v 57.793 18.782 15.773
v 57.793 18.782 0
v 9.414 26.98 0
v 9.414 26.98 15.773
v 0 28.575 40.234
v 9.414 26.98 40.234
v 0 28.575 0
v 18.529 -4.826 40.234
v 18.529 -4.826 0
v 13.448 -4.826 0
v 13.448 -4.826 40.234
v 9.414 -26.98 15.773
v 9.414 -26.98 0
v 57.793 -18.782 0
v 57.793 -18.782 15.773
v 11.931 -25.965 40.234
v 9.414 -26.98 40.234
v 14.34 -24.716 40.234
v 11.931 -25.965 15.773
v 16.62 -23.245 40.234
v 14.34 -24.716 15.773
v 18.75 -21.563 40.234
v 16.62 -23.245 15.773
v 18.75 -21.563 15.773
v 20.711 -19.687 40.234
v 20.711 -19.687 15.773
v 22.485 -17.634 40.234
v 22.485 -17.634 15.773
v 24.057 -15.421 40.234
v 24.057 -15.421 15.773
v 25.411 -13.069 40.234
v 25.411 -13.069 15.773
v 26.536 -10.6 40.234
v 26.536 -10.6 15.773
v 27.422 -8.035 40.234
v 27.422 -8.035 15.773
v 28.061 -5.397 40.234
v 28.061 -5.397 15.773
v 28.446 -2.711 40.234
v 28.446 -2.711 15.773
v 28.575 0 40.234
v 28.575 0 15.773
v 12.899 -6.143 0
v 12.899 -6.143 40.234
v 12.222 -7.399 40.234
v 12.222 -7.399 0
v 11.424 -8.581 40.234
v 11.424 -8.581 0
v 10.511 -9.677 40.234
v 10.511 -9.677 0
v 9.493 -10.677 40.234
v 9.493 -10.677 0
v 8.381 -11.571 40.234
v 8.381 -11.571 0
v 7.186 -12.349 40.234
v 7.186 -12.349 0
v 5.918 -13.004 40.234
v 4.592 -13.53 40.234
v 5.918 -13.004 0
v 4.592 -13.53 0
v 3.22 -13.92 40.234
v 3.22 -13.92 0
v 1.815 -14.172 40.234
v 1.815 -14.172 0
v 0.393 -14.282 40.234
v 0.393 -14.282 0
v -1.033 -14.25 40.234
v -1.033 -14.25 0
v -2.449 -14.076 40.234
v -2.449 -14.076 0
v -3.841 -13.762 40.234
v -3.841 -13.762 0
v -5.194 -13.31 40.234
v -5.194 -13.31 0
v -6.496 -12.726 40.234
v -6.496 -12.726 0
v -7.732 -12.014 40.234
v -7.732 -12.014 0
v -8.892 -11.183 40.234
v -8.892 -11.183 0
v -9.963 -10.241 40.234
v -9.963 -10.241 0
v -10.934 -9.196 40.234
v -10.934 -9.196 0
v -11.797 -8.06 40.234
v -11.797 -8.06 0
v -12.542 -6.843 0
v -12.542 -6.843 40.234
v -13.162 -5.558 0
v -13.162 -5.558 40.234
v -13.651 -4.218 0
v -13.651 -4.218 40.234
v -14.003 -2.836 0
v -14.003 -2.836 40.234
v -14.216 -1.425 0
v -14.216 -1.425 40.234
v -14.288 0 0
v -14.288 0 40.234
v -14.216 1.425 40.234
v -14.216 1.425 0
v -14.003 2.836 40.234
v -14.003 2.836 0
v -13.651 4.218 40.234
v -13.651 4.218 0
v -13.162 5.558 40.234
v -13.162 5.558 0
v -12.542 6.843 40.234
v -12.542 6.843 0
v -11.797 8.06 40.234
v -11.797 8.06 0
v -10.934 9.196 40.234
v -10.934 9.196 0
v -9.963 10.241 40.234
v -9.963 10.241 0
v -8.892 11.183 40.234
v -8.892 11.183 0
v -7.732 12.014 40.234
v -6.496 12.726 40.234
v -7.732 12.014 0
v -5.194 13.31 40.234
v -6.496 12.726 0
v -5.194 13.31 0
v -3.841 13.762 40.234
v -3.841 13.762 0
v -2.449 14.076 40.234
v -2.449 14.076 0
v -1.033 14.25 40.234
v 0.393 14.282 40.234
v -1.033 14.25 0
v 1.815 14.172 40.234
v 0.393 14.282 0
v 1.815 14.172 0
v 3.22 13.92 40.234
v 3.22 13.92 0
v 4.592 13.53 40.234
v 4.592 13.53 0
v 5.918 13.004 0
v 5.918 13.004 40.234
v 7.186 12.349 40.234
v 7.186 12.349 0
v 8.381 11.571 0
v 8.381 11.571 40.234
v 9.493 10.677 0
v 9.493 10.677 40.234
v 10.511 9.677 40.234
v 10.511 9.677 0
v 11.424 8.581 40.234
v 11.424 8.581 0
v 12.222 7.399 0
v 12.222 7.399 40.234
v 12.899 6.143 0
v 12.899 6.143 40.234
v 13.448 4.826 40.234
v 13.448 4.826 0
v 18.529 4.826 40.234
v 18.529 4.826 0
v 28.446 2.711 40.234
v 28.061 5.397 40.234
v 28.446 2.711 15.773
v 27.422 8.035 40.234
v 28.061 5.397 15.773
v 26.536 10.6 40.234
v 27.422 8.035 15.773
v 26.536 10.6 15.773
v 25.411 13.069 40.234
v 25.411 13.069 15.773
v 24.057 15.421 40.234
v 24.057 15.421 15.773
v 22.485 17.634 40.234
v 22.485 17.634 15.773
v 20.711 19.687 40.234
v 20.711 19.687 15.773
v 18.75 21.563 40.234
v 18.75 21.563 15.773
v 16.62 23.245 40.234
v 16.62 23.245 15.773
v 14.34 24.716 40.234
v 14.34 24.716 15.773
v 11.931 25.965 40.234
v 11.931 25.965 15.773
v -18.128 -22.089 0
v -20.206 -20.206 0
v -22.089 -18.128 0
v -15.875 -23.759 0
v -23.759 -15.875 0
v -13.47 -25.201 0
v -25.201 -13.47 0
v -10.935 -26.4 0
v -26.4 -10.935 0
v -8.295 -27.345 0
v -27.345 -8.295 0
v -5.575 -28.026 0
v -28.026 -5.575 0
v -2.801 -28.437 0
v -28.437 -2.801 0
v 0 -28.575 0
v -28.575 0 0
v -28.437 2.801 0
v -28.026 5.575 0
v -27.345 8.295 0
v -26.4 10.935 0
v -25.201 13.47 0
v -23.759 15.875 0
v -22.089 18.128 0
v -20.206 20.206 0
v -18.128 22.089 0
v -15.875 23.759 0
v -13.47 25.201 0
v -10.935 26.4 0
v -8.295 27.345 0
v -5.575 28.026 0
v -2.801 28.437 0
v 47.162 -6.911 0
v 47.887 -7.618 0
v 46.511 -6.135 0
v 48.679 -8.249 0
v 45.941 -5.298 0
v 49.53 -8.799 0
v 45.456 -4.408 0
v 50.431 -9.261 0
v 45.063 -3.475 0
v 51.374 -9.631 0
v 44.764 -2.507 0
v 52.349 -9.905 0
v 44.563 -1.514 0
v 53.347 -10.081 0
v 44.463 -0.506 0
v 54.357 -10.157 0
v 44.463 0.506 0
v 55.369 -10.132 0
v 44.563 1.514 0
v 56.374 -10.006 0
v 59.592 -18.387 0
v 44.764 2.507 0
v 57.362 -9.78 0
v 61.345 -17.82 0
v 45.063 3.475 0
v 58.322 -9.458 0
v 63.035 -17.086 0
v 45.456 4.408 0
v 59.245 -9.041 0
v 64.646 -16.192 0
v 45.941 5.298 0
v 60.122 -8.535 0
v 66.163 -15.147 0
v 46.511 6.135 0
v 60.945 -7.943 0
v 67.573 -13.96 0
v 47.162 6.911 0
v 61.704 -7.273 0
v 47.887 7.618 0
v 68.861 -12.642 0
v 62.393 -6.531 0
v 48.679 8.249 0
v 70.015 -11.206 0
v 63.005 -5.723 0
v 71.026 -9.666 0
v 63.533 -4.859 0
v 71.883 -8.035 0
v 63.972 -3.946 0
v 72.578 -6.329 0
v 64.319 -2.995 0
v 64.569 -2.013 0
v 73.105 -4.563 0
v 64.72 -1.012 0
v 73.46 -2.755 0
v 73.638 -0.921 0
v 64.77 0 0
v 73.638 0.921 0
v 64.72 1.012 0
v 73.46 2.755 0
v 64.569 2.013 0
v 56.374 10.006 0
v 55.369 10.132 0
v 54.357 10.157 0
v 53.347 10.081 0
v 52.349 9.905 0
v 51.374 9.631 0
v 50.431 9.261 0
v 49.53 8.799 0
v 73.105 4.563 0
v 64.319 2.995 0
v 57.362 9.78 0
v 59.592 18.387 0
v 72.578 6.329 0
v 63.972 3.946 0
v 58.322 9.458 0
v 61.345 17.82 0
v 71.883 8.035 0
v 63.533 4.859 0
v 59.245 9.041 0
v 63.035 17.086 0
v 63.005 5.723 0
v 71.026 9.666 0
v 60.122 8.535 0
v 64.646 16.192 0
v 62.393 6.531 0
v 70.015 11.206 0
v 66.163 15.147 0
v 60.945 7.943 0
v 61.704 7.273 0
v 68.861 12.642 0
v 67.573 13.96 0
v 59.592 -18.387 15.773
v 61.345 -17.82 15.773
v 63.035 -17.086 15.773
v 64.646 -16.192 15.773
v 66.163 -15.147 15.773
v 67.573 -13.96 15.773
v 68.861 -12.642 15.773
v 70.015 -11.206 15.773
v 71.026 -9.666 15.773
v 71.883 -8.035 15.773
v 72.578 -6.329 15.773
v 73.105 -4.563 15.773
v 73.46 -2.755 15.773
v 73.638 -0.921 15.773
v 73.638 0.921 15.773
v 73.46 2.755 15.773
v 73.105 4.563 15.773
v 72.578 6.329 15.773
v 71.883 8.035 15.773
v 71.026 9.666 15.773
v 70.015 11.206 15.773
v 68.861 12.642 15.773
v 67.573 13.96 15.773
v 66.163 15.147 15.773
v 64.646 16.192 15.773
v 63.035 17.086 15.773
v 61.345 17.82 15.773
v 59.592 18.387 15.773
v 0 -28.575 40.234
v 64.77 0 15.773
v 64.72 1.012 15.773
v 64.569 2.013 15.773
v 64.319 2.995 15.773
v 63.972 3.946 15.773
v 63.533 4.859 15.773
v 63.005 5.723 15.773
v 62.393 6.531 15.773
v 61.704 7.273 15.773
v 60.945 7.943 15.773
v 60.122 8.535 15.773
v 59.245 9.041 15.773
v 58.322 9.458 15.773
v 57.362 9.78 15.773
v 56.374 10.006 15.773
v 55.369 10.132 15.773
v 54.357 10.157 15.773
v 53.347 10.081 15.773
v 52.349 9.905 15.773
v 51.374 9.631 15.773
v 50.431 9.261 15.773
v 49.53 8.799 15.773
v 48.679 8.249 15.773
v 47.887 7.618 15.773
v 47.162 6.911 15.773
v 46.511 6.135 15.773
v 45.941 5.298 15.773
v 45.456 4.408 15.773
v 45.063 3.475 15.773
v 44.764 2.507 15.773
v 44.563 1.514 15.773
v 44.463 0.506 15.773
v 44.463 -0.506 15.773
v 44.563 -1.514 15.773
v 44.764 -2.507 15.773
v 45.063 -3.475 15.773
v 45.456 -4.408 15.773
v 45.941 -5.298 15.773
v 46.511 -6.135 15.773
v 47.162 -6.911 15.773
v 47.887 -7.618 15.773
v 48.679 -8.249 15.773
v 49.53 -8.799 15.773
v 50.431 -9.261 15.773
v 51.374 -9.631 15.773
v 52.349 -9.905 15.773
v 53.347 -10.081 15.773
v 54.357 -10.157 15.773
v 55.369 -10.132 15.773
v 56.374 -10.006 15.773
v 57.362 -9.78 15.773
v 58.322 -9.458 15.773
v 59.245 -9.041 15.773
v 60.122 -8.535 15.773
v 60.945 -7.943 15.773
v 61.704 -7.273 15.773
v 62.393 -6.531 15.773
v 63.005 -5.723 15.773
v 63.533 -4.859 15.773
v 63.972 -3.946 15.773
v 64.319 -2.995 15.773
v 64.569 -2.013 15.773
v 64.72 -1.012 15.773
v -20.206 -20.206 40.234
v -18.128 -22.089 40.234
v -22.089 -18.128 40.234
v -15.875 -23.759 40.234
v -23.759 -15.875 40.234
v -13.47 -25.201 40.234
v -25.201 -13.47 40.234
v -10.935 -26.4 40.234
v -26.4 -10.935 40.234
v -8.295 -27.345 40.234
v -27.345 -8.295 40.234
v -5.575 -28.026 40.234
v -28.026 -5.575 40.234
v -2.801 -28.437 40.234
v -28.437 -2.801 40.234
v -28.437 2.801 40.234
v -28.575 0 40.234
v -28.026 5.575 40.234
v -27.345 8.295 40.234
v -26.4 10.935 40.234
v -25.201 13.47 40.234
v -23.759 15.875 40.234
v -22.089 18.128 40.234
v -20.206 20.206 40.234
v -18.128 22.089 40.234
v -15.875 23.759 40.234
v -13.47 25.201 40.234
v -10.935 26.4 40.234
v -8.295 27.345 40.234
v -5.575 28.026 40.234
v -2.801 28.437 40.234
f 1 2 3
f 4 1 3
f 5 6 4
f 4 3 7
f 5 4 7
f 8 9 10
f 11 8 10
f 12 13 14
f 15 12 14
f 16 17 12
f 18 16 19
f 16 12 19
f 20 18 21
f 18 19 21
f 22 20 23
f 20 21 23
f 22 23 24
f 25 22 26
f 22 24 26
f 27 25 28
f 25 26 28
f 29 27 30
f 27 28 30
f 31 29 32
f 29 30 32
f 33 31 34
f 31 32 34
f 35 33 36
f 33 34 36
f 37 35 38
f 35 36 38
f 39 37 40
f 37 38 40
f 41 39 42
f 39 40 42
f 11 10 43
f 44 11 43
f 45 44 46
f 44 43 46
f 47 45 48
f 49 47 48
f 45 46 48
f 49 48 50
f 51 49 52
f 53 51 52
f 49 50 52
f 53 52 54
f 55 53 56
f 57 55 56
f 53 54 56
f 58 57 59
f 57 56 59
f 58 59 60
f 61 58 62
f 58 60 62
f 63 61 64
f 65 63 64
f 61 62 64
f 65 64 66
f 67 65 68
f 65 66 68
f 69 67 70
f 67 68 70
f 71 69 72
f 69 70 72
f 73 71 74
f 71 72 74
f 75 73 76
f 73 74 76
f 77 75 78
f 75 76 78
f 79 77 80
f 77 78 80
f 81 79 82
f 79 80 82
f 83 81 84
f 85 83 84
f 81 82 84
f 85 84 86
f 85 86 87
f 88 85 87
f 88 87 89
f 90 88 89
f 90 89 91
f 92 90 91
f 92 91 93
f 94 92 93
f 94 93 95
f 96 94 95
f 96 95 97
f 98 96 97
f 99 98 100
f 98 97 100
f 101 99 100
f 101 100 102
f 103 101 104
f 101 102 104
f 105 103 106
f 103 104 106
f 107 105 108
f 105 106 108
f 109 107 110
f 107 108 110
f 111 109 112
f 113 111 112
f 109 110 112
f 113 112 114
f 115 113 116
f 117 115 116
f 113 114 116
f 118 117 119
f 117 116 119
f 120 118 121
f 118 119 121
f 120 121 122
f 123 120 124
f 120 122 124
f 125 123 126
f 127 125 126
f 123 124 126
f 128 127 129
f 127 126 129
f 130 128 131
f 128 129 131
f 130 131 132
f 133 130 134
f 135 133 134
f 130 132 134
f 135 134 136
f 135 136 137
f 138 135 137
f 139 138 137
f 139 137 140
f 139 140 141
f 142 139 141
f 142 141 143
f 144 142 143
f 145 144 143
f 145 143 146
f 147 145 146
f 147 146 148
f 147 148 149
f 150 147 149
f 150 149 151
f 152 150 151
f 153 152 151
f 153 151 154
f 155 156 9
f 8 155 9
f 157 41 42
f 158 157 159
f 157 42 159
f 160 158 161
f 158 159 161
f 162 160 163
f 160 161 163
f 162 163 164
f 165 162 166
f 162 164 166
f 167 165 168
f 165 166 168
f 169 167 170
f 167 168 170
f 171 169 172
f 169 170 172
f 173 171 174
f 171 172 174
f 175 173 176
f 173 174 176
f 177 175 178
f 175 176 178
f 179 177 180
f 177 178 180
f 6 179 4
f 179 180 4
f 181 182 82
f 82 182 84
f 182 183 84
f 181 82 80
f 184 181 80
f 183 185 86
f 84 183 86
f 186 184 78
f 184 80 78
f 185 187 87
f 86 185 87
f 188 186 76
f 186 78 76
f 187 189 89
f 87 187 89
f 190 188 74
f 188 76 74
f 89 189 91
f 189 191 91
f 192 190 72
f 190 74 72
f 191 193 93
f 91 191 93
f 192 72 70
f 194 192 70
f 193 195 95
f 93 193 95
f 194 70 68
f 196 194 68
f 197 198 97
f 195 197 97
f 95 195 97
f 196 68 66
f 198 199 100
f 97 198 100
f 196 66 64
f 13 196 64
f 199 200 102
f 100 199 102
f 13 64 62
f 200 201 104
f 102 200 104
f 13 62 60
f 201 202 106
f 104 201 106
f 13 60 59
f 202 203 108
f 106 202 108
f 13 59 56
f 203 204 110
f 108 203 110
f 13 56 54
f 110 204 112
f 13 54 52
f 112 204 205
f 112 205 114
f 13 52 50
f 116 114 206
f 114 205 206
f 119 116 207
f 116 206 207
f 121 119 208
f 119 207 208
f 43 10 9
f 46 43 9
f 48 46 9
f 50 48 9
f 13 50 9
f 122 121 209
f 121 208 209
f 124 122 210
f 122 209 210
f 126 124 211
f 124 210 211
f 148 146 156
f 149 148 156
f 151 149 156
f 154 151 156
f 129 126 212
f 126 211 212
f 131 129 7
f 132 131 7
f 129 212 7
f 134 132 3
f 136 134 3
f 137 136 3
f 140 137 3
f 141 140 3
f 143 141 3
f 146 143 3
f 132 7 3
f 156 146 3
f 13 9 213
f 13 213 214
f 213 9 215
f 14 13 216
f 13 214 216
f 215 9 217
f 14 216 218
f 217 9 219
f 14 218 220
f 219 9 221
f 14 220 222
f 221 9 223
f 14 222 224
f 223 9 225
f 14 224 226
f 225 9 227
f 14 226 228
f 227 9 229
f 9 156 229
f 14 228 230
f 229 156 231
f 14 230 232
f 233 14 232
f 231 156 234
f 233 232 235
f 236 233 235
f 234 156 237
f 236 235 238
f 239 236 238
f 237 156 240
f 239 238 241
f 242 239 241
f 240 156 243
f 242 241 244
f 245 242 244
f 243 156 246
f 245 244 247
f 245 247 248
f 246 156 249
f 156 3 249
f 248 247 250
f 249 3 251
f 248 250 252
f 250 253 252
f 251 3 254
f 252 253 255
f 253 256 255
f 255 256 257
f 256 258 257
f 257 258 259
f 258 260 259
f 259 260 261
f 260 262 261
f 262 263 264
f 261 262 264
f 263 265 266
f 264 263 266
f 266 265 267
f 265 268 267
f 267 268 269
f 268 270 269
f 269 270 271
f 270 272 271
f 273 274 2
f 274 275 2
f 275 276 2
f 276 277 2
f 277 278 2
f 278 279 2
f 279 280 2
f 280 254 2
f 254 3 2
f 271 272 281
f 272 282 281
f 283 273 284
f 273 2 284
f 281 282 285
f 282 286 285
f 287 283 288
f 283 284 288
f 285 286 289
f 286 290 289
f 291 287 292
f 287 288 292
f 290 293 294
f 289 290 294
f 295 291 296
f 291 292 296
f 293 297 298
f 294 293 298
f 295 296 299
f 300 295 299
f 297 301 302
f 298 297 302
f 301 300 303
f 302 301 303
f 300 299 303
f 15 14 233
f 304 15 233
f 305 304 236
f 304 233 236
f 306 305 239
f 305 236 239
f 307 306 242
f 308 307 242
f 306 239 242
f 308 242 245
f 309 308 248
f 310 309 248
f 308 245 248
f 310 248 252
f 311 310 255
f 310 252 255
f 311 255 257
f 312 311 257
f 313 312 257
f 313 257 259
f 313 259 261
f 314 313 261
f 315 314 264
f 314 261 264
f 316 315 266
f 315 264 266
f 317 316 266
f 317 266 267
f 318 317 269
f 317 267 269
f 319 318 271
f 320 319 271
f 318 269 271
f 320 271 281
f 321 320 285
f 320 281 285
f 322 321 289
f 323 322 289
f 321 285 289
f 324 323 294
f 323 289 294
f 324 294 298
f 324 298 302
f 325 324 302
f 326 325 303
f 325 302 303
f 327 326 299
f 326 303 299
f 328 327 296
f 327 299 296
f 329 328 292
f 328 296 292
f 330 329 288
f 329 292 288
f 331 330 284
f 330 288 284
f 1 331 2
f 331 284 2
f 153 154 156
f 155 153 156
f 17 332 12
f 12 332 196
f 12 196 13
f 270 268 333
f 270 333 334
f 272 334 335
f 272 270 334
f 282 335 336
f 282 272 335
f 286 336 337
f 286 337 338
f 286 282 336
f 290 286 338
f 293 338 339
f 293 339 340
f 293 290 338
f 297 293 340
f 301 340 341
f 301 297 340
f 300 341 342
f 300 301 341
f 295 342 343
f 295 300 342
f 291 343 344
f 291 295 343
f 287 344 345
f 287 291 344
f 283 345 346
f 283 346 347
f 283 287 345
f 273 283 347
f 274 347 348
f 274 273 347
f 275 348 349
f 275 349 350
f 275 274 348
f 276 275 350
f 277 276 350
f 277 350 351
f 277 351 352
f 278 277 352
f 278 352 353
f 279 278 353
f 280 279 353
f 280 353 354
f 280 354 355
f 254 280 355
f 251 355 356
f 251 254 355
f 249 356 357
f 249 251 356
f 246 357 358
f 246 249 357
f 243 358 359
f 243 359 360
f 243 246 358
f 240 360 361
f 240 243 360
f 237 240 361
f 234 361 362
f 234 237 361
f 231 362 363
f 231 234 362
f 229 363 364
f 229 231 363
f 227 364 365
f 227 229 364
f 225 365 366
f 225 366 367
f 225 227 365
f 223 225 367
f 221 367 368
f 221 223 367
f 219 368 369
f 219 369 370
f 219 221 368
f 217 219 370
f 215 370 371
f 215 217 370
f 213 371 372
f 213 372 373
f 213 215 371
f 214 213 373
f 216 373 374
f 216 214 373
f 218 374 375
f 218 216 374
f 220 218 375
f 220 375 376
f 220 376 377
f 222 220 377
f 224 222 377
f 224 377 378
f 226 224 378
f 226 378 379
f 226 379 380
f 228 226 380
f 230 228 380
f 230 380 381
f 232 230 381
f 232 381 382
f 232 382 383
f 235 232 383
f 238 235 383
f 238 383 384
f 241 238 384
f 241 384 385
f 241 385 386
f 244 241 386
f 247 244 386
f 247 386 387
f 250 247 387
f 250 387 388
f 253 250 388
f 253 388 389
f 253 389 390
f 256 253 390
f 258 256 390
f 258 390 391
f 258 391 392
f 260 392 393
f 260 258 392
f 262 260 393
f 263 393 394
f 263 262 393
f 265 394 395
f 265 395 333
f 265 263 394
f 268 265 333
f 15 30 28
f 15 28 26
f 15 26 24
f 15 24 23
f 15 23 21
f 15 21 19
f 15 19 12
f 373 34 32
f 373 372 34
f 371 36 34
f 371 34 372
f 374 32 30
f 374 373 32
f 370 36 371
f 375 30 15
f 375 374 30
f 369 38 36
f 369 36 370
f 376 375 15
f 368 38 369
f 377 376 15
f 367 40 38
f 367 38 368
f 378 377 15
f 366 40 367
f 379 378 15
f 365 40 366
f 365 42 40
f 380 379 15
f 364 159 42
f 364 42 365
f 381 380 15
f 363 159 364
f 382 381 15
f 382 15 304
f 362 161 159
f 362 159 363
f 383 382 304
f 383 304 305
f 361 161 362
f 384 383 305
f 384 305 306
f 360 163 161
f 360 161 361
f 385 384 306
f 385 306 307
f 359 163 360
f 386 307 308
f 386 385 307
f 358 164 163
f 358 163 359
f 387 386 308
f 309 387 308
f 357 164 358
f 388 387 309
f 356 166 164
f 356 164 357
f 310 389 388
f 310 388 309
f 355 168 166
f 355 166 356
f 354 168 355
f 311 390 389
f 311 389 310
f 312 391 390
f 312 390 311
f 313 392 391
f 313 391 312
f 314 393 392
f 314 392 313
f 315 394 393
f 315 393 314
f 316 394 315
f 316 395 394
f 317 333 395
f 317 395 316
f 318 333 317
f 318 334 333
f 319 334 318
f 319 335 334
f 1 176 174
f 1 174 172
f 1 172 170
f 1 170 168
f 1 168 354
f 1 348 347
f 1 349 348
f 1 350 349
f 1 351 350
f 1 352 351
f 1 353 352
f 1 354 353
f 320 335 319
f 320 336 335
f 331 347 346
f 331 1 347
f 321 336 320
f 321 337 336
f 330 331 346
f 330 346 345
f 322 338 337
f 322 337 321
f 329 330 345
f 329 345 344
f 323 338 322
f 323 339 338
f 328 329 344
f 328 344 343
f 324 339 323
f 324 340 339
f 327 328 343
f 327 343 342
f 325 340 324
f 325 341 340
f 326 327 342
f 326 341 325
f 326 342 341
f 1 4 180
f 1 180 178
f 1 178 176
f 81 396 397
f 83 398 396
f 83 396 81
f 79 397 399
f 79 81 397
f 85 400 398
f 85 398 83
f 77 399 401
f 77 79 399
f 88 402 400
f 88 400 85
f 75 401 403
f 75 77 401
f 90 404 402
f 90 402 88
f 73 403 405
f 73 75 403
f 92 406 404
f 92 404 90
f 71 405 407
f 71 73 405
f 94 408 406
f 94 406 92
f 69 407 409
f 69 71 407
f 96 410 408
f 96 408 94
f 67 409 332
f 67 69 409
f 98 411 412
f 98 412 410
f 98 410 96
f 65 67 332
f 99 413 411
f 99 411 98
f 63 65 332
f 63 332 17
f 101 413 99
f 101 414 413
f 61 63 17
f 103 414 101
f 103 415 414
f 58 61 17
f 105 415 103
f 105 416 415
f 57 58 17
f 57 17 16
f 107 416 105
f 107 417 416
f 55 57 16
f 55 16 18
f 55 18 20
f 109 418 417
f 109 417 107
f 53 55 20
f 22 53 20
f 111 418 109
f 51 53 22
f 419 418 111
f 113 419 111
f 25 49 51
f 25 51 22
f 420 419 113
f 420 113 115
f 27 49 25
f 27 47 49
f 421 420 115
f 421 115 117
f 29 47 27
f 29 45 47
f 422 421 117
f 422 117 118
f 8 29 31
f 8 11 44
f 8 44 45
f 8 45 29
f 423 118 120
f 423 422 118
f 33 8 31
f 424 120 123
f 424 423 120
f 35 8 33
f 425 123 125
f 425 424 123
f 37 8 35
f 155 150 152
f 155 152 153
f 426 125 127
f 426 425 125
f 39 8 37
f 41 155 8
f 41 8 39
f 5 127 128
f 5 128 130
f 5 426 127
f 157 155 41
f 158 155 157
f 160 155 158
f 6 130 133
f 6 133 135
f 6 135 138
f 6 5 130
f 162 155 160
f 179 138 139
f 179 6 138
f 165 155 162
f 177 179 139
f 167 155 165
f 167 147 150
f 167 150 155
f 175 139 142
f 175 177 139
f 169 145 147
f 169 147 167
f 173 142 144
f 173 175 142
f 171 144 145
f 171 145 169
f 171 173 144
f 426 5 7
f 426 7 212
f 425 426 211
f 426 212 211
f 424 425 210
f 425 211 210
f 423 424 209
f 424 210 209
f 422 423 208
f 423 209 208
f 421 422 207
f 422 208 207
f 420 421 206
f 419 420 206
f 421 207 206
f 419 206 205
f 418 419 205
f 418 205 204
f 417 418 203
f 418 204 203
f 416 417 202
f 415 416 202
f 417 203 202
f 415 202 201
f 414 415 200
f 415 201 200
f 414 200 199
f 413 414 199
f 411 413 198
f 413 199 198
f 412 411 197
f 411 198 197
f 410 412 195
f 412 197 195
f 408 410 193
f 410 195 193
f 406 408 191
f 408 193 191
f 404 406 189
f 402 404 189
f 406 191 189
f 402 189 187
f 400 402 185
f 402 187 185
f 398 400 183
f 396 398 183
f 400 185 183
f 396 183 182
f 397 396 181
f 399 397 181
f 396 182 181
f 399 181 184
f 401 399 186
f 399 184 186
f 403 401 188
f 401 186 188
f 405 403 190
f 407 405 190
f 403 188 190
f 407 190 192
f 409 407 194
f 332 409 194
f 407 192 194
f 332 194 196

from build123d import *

# Parameters (mm, degrees)
F0_R     = 10.16
F1_DEPTH = 15.7734
F2_DEPTH = 40.2336


with BuildPart() as f1:
    # F0 (on Top) → F1 (new body)
    with BuildSketch(Plane.XY):
        with BuildLine():
            Line((57.792583, 18.78227), (9.413565, 26.979908))
            ThreePointArc((9.413565, 26.979908), (23.297245, 16.545967), (28.575, 0))
            ThreePointArc((28.575, 0), (23.297245, -16.545967), (9.413565, -26.979908))
            Line((9.413565, -26.979908), (57.792583, -18.78227))
            ThreePointArc((57.792583, -18.78227), (73.66, 0), (57.792583, 18.78227))
        make_face()
        with Locations((54.61, 0)):
            Circle(F0_R, mode=Mode.SUBTRACT)
    extrude(amount=F1_DEPTH)

    # F0 (on Top) → F2 (join)
    with BuildSketch(Plane.XY):
        with BuildLine():
            Line((9.413565, 26.979908), (0, 28.575))
            ThreePointArc((0, 28.575), (-28.575, 0), (0, -28.575))
            Line((0, -28.575), (9.413565, -26.979908))
            ThreePointArc((9.413565, -26.979908), (23.297245, -16.545967), (28.575, 0))
            ThreePointArc((28.575, 0), (23.297245, 16.545967), (9.413565, 26.979908))
        make_face()
        with BuildLine():
            ThreePointArc((13.447765, -4.826), (-14.2875, 0), (13.447765, 4.826))
            Line((13.447765, 4.826), (18.5293, 4.826))
            Line((18.5293, 4.826), (18.5293, -4.826))
            Line((18.5293, -4.826), (13.447765, -4.826))
        make_face(mode=Mode.SUBTRACT)
    extrude(amount=F2_DEPTH)


solid = f1.part
